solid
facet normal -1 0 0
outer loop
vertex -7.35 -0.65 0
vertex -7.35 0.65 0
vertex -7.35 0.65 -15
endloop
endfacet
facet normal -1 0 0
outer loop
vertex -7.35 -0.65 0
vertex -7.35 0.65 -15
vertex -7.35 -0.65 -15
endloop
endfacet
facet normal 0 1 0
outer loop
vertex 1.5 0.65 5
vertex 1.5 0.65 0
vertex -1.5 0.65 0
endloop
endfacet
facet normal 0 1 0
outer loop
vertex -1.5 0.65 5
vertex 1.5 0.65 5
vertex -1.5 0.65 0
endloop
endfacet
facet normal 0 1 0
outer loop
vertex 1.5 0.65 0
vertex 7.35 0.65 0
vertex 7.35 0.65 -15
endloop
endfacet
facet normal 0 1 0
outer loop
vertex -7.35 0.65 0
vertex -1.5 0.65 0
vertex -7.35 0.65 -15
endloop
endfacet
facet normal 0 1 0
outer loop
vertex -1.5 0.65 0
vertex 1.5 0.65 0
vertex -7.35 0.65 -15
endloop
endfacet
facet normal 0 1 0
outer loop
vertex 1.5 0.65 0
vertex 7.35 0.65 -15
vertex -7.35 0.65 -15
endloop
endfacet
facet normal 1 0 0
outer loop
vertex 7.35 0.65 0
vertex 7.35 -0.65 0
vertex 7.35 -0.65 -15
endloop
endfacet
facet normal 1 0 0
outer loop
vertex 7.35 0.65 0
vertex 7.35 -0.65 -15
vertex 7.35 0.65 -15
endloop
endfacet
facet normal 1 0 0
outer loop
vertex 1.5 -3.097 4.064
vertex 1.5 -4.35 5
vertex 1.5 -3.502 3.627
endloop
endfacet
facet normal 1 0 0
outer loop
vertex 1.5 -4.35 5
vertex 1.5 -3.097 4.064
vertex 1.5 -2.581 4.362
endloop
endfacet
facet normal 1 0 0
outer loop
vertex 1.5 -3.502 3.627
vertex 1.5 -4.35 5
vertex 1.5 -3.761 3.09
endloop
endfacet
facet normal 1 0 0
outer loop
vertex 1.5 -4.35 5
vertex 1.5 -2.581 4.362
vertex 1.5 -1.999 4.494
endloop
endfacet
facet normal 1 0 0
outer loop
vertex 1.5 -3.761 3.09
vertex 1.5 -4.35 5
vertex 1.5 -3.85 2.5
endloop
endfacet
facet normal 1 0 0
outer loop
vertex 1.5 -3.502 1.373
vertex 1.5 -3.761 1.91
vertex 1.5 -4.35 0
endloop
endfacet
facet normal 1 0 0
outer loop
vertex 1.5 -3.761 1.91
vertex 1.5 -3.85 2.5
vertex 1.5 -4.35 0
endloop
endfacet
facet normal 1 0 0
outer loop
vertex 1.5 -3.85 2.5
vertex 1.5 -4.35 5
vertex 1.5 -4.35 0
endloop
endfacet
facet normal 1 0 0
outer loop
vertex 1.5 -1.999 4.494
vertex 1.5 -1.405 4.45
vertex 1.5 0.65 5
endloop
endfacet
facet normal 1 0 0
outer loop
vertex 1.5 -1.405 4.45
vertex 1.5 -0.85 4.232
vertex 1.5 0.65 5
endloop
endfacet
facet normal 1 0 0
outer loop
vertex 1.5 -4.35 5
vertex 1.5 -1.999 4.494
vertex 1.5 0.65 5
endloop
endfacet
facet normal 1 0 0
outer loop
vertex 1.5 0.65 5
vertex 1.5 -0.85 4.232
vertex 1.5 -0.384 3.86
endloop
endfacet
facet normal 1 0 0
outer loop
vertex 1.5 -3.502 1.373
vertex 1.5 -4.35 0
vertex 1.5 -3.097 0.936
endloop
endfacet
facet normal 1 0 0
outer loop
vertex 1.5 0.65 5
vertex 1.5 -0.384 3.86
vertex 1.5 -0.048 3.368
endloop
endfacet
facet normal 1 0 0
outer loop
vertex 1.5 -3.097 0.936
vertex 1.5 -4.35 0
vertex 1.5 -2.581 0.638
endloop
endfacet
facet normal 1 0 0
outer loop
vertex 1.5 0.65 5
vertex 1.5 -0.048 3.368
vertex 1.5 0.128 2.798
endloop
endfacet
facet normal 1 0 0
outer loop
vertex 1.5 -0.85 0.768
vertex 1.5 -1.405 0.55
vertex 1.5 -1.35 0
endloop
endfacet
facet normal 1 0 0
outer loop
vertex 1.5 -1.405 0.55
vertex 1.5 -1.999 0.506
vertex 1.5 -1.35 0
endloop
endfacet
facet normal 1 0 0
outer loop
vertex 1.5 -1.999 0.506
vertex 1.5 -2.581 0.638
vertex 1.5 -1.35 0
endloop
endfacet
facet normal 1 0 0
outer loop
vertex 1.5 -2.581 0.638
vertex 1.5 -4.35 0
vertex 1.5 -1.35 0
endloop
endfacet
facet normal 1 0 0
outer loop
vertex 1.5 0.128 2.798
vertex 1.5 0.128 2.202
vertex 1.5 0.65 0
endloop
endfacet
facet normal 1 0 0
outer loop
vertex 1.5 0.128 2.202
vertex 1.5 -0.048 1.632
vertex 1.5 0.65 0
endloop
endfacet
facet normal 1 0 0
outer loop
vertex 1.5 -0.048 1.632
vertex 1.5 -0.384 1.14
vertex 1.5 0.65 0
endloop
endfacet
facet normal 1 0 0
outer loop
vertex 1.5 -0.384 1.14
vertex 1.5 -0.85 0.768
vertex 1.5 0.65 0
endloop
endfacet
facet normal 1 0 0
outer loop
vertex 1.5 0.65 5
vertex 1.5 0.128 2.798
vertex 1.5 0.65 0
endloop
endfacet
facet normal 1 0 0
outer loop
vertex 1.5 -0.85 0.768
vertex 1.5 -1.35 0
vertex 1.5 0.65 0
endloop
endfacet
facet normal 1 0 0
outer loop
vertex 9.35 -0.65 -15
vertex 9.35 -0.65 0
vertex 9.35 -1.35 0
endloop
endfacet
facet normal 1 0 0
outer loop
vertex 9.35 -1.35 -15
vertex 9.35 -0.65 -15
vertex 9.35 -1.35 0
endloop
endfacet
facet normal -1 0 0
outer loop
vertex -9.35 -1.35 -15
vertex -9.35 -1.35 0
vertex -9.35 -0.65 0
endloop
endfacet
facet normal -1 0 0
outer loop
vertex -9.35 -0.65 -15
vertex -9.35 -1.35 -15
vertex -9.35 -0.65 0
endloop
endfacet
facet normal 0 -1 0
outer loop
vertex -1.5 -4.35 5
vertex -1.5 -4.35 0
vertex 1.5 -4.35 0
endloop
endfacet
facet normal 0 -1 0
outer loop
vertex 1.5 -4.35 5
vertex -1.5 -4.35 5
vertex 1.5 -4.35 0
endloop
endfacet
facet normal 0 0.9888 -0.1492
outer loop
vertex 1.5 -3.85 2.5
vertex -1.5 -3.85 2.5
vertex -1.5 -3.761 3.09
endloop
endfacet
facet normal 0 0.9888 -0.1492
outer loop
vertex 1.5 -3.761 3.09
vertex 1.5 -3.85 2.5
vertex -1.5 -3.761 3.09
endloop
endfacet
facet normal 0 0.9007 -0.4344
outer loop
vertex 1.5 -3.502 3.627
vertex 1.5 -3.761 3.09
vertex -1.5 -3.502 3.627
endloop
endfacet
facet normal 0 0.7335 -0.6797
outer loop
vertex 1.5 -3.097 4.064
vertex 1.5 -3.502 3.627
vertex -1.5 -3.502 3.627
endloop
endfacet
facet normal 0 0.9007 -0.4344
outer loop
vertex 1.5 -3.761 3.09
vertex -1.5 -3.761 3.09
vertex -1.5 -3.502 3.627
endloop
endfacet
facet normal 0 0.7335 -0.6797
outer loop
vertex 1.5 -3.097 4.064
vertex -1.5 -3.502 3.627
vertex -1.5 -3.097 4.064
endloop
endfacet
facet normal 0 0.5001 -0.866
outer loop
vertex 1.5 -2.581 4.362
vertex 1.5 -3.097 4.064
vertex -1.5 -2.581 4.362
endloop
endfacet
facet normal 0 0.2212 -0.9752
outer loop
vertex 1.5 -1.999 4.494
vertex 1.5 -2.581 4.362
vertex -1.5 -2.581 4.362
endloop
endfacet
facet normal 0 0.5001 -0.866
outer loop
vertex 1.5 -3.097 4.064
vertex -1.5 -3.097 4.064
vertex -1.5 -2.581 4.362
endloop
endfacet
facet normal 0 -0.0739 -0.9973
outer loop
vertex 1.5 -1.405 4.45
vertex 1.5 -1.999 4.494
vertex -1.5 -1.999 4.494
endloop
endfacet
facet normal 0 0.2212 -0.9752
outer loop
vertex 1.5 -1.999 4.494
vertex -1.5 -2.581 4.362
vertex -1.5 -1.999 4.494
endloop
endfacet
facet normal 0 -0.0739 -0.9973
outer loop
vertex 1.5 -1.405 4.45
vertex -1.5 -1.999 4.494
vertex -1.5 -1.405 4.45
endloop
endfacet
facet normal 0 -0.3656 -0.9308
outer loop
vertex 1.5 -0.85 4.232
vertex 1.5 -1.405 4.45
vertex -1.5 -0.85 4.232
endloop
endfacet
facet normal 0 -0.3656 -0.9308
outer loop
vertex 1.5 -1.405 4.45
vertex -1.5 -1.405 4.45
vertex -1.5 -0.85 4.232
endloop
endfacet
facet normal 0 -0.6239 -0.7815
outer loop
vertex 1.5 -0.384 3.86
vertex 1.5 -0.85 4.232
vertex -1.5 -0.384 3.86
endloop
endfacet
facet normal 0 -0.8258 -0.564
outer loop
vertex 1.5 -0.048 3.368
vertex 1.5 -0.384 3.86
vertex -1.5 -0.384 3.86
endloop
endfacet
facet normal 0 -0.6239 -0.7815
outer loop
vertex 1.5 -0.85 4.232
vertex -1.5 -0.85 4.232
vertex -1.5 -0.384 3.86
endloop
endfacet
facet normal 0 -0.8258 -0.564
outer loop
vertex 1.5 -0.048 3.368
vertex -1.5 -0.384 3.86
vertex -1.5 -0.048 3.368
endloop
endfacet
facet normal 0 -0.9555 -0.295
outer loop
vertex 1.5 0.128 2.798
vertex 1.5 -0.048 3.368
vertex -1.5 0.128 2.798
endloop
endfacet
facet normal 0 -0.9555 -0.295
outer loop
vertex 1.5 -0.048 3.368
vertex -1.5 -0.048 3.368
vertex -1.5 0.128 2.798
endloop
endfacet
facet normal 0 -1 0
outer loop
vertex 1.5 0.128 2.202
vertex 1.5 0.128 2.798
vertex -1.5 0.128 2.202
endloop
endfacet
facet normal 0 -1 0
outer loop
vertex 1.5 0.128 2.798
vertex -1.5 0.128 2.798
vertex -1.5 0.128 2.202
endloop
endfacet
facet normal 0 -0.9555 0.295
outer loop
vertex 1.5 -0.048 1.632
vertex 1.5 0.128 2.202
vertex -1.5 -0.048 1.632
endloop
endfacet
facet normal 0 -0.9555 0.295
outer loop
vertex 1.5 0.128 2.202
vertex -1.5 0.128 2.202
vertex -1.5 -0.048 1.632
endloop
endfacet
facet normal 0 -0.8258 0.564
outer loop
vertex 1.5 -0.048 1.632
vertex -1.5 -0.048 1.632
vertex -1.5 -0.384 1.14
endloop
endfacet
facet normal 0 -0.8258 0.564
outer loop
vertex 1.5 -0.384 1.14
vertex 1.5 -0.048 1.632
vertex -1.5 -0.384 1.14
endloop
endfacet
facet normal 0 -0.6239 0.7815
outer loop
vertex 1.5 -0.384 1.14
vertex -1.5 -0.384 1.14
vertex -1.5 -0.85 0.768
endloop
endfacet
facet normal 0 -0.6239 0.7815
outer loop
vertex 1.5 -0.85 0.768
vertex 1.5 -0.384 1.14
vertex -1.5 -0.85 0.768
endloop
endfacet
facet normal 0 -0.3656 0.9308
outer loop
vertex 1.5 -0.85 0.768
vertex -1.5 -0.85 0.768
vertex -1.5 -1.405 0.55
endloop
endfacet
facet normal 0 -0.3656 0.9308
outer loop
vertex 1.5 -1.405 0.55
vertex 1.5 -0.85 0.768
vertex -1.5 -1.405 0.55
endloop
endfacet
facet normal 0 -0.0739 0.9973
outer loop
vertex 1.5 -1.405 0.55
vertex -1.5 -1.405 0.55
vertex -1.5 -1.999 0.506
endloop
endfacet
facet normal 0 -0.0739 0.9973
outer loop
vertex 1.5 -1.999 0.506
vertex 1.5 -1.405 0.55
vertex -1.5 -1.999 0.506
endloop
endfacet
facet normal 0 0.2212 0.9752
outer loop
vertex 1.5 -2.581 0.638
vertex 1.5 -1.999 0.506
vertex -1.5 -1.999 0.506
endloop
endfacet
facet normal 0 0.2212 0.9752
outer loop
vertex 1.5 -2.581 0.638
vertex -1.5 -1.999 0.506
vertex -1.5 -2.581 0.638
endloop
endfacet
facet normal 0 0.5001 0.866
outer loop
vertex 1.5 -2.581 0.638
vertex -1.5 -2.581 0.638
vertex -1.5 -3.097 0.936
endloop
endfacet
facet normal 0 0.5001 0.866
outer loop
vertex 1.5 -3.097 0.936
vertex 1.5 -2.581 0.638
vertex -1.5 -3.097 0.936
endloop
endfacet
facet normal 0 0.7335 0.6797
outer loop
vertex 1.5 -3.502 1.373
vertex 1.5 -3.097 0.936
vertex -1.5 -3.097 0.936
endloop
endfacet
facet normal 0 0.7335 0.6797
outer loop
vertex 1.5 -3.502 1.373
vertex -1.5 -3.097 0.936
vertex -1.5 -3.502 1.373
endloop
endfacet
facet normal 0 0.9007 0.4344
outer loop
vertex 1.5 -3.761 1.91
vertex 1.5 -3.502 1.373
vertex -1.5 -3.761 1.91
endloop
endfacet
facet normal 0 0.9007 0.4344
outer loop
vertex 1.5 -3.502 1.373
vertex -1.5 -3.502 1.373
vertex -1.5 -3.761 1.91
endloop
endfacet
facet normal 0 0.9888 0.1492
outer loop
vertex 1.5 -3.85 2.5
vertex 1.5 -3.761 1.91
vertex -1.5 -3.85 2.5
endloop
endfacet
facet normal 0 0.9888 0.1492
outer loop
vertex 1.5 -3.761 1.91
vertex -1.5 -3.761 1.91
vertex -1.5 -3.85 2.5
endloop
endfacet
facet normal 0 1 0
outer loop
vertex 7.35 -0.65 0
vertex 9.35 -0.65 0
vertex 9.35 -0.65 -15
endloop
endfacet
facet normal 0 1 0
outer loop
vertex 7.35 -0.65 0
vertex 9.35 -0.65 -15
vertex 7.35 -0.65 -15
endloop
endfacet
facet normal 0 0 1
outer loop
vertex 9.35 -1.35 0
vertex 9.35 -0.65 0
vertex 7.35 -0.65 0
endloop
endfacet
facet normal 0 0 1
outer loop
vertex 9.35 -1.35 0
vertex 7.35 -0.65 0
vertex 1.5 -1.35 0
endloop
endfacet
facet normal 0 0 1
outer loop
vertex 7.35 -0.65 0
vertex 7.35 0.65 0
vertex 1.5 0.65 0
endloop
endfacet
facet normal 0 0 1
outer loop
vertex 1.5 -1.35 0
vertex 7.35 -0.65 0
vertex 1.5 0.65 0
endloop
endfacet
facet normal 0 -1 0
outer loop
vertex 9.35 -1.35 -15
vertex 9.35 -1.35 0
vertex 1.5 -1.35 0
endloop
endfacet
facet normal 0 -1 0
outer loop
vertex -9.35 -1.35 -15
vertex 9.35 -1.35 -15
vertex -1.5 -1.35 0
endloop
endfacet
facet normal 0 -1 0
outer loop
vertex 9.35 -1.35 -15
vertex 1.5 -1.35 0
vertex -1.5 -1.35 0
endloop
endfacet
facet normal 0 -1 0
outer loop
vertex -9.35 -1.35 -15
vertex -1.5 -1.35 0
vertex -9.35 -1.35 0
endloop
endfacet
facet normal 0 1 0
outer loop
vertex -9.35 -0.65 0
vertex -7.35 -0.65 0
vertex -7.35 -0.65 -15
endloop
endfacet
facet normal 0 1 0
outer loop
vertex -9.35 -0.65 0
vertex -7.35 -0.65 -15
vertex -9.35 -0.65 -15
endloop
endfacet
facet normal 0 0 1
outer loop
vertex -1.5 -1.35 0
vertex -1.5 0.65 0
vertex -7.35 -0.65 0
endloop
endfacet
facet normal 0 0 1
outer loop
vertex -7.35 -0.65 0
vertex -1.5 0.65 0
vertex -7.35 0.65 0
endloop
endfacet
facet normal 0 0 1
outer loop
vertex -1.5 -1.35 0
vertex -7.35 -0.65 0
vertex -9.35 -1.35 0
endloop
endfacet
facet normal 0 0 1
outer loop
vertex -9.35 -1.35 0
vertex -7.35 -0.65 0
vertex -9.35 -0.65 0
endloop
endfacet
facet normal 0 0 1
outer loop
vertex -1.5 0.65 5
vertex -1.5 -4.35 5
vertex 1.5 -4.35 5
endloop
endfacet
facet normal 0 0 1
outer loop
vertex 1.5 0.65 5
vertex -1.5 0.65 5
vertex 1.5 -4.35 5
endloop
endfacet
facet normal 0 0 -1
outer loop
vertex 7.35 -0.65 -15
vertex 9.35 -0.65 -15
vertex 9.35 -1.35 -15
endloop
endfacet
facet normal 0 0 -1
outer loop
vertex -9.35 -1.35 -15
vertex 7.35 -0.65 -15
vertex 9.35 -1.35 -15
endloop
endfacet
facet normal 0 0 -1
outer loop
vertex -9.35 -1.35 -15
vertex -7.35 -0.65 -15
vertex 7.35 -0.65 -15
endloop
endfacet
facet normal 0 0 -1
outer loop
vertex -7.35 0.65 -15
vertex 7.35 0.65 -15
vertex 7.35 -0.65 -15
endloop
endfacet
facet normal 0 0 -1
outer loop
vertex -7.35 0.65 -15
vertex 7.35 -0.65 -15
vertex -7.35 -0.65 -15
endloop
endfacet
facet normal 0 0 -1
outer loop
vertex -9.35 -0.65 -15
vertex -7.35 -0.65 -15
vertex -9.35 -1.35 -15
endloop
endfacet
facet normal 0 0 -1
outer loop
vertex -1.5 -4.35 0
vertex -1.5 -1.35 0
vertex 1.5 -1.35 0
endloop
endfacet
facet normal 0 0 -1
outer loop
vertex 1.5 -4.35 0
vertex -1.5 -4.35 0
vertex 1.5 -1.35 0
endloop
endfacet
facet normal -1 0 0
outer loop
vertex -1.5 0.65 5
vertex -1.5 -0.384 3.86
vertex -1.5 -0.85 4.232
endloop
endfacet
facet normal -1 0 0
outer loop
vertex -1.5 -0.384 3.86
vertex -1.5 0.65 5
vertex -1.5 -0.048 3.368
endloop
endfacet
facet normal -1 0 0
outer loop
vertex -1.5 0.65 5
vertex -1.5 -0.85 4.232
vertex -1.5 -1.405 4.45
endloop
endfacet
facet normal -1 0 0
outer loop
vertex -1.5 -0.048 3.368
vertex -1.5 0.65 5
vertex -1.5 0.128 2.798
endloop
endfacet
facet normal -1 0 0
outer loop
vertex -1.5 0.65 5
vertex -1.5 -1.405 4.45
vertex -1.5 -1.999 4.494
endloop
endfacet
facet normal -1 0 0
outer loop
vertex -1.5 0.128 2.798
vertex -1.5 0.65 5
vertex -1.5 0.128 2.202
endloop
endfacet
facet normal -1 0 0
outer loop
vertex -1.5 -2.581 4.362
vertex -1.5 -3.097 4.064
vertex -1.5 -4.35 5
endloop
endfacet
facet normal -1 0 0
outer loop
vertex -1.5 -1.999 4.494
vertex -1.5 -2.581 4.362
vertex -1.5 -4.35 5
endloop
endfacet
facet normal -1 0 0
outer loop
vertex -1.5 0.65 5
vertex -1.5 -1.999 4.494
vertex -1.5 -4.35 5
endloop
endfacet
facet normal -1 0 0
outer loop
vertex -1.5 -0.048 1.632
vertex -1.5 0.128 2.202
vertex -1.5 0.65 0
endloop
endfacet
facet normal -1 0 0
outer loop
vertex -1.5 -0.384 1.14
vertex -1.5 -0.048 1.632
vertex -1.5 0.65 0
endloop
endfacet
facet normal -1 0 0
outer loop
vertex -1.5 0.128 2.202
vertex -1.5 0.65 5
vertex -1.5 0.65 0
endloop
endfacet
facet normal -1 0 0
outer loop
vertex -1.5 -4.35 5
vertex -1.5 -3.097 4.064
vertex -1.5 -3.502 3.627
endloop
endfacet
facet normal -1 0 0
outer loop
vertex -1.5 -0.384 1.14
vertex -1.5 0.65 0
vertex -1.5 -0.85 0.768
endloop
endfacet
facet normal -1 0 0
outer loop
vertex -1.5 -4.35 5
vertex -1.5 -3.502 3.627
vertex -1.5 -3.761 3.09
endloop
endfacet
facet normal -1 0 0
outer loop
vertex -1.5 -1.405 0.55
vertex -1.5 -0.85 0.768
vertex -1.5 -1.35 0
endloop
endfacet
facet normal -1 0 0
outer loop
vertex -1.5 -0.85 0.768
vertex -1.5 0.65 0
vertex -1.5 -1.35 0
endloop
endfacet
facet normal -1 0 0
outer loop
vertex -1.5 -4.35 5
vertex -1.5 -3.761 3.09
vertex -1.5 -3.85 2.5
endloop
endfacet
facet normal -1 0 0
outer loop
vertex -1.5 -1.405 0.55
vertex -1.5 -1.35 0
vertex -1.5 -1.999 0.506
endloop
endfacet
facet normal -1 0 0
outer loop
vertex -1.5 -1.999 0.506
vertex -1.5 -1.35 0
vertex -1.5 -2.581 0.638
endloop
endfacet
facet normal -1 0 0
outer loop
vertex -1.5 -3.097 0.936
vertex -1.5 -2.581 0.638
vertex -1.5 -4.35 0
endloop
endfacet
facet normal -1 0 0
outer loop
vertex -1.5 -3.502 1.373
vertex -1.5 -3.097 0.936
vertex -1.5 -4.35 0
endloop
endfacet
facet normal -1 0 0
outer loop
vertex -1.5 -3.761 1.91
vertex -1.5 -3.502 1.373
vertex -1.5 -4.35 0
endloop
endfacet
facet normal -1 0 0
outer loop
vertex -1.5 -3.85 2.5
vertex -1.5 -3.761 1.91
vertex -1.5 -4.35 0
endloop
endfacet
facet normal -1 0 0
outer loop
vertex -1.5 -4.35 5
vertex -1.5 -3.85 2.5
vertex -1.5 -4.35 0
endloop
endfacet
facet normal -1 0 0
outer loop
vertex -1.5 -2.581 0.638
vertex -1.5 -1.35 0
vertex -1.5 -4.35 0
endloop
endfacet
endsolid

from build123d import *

# Parameters (mm, degrees)
BOSS_EXTRUDE1_DEPTH = 15
SKETCH2_W           = 3
SKETCH2_H           = 1.5
SKETCH2_W_2         = 1.5
SKETCH2_H_2         = 2
BOSS_EXTRUDE3_DEPTH = 5
SKETCH4_R           = 2
CUT_EXTRUDE1_DEPTH  = 3


with BuildPart() as part:
    # Sketch1 → Boss-Extrude1 (new body)
    with BuildSketch(Plane.XY):
        Polygon((7.5, -0.65), (9.35, -0.65), (9.35, -1.35), (-9.35, -1.35), (-9.35, -0.65), (-7.5, -0.65), (-7.35, -0.65), (-7.35, -0.5), (-7.35, 0.35), (-7.35, 0.65), (7.35, 0.65), (7.35, 0.35), (7.35, -0.5), (7.35, -0.65), align=None)
    extrude(amount=-BOSS_EXTRUDE1_DEPTH)

    # Sketch2 → Boss-Extrude3 (add)
    with BuildSketch(Plane.XY):
        with Locations((0, -3.6)):
            Rectangle(SKETCH2_W, SKETCH2_H)
        Polygon((1.5, -1.35), (0, -1.35), (-1.5, -1.35), (-1.5, -2.85), (1.5, -2.85), align=None)
        with Locations((-0.75, -0.35)):
            Rectangle(SKETCH2_W_2, SKETCH2_H_2)
        with Locations((0.75, -0.35)):
            Rectangle(SKETCH2_W_2, SKETCH2_H_2)
    extrude(amount=BOSS_EXTRUDE3_DEPTH)

    # Sketch4 → Cut-Extrude1 (cut)
    with BuildSketch(Plane.ZY.offset(1.5)):
        with Locations(Location((2.5, -1.85, 0), (0, 0, 270))):
            Circle(SKETCH4_R)
    extrude(amount=-CUT_EXTRUDE1_DEPTH, mode=Mode.SUBTRACT)


solid = part.part
